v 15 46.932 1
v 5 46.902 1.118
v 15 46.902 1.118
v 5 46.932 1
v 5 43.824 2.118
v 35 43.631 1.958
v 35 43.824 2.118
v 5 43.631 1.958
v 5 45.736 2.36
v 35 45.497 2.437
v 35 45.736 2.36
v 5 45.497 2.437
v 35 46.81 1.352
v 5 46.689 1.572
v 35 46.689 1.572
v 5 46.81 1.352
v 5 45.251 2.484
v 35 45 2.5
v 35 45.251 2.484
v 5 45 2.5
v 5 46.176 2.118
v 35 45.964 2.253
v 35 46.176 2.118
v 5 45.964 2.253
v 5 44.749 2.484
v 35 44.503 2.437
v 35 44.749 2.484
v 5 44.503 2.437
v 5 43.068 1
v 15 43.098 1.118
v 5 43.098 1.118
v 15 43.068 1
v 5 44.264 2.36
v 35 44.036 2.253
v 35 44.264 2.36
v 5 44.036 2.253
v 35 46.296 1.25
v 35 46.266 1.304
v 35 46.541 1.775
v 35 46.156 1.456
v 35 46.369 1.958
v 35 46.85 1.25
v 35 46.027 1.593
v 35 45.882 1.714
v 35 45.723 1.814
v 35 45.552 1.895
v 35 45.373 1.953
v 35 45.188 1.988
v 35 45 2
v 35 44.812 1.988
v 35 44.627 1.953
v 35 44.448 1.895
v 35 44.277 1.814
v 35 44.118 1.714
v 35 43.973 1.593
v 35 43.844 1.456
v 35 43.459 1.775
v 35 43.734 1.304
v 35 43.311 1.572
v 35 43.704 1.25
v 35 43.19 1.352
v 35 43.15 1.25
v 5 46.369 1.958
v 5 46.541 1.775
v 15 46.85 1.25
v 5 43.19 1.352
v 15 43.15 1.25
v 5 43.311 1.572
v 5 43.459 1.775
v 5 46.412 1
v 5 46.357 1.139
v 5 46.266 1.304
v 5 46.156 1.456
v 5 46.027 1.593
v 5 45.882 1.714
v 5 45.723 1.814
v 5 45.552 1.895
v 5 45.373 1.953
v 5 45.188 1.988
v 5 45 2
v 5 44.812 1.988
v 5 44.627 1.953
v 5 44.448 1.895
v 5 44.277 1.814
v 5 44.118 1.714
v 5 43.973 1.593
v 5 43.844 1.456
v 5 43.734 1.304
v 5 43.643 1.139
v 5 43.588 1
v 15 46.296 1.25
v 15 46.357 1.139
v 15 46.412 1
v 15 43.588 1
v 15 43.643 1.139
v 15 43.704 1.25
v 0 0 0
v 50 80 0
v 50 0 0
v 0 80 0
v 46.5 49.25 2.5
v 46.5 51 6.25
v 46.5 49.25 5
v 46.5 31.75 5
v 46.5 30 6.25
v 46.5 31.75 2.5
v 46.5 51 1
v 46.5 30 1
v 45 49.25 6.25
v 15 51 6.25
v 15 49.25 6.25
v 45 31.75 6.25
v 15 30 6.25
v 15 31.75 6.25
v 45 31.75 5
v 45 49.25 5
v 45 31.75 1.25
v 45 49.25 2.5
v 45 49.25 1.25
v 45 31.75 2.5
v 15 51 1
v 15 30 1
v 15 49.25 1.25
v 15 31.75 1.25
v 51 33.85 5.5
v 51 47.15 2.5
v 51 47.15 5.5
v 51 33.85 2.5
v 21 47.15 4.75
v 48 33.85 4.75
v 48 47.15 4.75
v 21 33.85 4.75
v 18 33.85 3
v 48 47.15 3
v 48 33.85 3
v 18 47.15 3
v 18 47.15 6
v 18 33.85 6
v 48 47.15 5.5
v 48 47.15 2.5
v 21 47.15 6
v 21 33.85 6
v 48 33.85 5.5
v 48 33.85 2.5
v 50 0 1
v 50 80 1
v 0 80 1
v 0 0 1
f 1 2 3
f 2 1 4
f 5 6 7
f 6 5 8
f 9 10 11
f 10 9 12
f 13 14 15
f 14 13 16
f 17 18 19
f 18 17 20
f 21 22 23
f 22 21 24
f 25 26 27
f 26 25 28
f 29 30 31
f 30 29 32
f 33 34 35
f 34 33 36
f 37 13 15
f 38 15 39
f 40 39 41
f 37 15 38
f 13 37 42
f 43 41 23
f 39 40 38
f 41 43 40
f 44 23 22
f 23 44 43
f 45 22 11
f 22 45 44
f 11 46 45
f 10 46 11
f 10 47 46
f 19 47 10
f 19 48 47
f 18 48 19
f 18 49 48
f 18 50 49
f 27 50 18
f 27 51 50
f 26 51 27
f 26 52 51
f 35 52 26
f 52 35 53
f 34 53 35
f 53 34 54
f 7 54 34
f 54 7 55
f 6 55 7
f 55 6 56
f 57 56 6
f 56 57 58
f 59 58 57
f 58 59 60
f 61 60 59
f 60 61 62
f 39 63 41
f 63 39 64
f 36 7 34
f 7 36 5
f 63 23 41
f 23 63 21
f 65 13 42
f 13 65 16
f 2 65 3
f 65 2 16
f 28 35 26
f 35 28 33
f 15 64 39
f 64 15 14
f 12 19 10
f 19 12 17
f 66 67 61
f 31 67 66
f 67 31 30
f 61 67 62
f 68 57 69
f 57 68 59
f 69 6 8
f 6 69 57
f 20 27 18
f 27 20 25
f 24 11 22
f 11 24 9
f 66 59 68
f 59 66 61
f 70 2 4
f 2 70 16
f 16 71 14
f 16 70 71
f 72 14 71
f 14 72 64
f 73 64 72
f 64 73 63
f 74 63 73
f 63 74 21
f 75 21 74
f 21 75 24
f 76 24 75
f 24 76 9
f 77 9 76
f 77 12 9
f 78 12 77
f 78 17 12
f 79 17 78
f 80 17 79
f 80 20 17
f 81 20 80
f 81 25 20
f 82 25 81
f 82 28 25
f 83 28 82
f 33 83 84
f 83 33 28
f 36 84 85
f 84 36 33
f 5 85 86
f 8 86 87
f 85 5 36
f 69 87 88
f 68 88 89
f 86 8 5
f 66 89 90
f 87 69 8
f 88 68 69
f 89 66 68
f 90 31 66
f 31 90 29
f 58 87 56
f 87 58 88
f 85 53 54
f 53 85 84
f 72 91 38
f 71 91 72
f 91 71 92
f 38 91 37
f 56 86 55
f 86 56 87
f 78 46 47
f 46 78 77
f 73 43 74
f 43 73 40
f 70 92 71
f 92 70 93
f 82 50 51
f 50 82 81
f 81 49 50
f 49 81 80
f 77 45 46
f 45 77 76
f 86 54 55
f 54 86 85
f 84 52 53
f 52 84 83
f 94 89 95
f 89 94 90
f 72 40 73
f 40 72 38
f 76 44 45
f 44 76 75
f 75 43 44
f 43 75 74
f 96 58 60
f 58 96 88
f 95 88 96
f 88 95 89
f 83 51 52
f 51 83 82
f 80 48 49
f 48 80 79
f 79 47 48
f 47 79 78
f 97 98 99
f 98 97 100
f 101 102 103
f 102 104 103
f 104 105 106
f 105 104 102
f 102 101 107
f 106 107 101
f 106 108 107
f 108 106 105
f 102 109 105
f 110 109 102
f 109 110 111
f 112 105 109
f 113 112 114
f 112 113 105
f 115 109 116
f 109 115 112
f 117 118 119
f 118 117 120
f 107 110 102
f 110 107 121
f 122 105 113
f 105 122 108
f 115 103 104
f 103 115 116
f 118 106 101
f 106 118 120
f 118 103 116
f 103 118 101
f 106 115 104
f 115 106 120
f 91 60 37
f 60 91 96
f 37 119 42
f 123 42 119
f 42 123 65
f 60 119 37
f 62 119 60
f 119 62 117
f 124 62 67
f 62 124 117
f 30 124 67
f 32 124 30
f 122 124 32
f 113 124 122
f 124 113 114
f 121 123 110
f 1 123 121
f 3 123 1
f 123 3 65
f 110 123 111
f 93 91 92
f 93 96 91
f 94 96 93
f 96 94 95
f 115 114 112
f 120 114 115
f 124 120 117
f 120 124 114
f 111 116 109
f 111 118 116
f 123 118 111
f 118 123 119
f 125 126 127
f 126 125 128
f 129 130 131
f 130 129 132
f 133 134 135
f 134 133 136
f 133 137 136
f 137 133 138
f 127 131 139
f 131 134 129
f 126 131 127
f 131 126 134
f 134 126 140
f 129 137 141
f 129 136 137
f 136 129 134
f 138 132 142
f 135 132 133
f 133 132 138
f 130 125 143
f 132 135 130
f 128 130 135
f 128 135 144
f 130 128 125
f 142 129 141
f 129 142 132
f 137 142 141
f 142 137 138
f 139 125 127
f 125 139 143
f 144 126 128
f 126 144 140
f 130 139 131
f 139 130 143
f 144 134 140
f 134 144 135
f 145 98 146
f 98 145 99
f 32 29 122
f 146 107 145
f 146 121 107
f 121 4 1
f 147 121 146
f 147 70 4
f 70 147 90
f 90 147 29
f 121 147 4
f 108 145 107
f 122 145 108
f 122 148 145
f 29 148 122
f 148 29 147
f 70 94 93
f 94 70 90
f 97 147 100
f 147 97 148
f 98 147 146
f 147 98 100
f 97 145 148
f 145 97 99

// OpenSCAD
module outer_box(){
 	cube([10, 6, 0.5]);
 
	//right wall
 	translate([0, 0, .5])
 		cube([10, 0.5, 2]);
 	//left wall
 	translate([0, 5.5, .5])
 		cube([10, 0.5, 2]);

	//bottom wall
	difference(){
		translate([10, 0, 0])
			cube([.5, 6, 2.5]);
		translate([9.5, .5, 1])
			cube([2, 5, 1]);
	}
 }
 
module inner_slide(){
 	color("blue")
 		translate([1, 1.1, 1.2]){
 			cube([11, 3.8, 0.7]);
 			cube([1, 3.8, 1.2]);
			translate([10, 0, -.2]) cube([1, 3.8, 1.2]);
 	}
 }
 
module pulley(){
	outer_box();
	translate([0, 0, 0])
		inner_slide();
}
module  straw(){
	difference(){
		difference(){
			cylinder($fn=50, h=30, r=2, center=true);
			cylinder($fn=50, h=40, r=1.5, center=true);
		}
	
		translate([.5, -3, -15])	cube([6, 6, 40]);
	}
}

translate([20, 45, .5]) rotate([0, 90, 0])
straw();

translate([15, 30, 0]) scale([3, 3.5, 2.5])
	pulley();

//base
difference(){
	cube([50, 80, 1]);
	translate([22, 31, 3]) cube([30, 16, 4]);
}
